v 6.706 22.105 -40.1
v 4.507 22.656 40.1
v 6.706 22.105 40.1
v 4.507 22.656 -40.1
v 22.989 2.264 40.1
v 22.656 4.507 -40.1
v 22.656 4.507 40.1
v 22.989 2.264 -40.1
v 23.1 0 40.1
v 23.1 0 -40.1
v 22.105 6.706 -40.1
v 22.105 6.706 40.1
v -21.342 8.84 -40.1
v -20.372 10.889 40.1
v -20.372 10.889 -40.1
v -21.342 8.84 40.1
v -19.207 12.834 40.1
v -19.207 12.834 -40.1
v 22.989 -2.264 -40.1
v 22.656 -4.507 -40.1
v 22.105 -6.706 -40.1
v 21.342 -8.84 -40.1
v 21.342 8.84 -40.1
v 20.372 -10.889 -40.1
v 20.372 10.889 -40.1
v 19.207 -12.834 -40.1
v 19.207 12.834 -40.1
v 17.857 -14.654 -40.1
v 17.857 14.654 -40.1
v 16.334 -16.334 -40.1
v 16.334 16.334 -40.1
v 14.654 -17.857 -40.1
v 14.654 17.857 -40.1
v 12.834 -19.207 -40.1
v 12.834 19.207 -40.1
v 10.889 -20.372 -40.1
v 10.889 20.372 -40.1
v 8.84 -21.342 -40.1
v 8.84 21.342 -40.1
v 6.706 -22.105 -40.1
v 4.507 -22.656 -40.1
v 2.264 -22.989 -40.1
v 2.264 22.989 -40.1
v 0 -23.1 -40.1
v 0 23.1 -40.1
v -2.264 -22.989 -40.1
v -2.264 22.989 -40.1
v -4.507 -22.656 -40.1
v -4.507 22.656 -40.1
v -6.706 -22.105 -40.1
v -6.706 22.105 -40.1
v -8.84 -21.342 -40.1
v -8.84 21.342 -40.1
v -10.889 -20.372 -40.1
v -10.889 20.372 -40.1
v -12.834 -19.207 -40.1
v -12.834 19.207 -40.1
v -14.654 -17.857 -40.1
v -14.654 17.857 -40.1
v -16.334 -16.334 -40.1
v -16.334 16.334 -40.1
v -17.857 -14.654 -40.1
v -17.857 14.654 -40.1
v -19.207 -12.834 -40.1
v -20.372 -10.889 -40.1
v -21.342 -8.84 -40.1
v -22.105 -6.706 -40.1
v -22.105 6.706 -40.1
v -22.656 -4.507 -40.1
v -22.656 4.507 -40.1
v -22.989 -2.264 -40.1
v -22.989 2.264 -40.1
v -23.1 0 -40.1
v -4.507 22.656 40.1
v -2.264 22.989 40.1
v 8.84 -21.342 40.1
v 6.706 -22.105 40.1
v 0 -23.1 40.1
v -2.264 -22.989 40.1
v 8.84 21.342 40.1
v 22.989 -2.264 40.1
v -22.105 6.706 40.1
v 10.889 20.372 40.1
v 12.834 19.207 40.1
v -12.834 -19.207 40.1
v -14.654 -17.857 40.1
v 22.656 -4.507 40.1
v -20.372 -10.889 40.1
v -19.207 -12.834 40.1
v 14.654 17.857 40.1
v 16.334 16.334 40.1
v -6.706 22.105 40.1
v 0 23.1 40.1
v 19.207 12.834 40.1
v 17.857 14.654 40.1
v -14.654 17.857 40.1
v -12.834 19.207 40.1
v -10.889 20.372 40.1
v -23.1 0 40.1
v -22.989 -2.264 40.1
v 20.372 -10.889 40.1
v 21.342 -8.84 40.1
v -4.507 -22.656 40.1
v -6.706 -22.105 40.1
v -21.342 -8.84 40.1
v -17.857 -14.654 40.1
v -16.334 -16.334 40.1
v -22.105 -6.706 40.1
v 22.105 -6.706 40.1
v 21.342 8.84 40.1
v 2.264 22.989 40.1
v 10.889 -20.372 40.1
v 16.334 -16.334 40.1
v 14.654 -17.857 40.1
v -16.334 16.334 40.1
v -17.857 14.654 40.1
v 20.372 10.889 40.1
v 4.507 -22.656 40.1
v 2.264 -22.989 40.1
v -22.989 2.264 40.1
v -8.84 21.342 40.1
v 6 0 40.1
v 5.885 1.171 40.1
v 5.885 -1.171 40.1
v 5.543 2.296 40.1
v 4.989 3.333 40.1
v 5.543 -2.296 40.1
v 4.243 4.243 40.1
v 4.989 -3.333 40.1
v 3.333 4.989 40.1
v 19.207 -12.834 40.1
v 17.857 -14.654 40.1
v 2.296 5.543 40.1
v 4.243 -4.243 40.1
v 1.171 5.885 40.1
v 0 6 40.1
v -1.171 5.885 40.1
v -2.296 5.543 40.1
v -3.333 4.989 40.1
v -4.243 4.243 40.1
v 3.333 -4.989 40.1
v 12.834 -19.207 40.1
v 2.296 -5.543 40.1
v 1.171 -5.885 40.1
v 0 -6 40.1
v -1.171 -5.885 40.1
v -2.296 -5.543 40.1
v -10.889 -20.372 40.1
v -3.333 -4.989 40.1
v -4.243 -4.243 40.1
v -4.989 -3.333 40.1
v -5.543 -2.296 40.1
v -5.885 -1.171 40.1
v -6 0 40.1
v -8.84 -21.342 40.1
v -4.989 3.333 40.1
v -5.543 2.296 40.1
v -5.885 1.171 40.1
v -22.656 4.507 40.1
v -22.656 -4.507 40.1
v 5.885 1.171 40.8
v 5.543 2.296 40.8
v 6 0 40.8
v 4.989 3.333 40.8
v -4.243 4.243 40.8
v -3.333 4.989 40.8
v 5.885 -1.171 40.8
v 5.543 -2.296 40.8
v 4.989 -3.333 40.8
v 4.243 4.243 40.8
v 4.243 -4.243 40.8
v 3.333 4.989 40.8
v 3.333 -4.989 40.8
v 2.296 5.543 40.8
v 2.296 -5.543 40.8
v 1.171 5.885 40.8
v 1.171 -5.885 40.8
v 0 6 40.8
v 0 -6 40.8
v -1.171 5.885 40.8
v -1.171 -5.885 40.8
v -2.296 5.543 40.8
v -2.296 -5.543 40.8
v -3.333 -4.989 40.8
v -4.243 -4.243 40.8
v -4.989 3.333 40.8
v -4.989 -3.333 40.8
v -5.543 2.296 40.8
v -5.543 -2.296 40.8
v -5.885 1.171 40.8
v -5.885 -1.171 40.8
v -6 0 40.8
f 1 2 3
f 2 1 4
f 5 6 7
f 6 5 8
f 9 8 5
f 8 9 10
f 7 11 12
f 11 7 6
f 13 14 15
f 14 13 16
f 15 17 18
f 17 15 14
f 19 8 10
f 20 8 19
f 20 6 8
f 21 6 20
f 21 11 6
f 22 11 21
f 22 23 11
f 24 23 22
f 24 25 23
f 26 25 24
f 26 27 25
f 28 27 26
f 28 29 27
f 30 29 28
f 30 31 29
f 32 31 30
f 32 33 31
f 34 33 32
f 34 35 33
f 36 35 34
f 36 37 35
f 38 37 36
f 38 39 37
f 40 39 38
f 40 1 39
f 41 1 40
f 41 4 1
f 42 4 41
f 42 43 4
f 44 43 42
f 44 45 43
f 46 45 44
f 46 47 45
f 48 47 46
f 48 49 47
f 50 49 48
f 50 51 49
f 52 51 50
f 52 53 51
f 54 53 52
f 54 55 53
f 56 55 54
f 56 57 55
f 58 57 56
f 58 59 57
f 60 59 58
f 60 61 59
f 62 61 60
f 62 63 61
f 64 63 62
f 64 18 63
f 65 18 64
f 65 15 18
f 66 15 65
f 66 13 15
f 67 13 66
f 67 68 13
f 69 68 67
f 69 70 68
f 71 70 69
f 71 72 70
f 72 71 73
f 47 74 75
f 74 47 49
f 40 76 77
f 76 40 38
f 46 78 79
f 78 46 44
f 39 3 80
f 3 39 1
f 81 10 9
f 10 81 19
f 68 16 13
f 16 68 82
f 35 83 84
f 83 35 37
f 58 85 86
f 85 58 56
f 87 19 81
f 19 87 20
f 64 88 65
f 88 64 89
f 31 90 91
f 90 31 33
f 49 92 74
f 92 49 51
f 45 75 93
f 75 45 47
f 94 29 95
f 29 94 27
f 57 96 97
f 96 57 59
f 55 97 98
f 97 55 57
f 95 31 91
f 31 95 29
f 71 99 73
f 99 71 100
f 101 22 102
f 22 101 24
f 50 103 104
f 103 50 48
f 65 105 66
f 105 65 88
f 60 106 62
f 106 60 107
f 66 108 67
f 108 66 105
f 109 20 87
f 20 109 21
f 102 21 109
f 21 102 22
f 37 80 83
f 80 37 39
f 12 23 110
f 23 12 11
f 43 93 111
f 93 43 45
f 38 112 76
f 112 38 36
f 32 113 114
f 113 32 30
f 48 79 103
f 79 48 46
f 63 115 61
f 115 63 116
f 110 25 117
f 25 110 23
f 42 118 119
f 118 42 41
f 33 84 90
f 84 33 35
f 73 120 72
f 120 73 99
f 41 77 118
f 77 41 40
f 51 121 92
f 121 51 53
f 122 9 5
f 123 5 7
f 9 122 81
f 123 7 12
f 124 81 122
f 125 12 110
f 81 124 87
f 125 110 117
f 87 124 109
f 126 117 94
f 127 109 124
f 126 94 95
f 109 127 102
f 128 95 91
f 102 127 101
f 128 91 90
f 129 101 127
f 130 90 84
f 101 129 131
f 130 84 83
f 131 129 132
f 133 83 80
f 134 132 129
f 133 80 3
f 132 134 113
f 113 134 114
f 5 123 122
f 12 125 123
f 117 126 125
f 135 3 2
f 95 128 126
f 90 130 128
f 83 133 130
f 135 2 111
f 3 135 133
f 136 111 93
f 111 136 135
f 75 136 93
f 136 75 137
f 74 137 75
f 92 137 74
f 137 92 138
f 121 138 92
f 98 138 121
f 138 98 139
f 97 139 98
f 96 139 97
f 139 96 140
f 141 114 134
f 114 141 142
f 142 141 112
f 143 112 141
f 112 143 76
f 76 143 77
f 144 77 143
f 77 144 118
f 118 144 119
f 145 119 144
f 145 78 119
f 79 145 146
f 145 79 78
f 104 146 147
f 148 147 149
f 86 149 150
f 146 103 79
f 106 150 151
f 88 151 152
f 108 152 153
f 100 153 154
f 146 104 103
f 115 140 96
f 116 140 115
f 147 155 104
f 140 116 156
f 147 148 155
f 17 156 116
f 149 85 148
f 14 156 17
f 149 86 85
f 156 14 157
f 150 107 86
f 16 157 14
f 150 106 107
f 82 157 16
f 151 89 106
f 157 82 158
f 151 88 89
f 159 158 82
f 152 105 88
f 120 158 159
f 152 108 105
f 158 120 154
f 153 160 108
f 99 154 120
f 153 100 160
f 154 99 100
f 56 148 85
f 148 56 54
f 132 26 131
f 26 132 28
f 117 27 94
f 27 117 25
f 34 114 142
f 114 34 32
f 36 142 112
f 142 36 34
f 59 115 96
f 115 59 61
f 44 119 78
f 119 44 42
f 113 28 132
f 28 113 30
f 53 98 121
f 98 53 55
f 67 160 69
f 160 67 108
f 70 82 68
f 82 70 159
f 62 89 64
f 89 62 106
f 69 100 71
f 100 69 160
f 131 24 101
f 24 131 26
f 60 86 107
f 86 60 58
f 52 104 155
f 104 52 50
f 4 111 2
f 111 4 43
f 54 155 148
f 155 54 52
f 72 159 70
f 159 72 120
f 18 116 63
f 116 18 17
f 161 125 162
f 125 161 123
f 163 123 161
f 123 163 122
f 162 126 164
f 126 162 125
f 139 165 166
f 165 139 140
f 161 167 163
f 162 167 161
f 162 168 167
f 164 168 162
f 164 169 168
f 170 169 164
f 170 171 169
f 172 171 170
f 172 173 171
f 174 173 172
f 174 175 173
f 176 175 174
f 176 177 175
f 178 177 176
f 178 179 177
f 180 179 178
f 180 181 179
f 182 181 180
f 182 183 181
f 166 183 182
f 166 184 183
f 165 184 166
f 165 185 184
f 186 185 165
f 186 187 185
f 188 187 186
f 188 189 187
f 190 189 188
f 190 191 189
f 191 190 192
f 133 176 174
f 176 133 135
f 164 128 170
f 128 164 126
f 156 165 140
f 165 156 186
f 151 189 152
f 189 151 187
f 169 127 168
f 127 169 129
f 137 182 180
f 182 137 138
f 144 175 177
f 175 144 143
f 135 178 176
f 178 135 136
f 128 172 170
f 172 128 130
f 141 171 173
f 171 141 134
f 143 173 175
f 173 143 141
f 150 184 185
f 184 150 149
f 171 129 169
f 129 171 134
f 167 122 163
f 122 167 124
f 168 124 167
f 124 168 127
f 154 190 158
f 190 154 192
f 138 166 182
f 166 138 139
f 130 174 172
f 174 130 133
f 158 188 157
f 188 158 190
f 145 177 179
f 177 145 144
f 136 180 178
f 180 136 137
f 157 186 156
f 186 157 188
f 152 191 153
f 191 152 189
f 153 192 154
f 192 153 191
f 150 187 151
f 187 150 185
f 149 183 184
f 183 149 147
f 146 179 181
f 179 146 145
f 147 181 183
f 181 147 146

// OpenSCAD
// Parameters
height_mm = 80.2; //[40.1:160.4:0.1]
diameter_mm = 46.2; //[23.1:92.4:0.1]
body_diameter_mm = 46.2; //[23.1:92.4:0.1]
body_height_mm = 80.2; //[40.1:160.4:0.1]
positive_terminal_diameter_mm = 12; //[6:24:0.1]
positive_terminal_height_mm = 1.5; //[0.75:3:0.05]
negative_terminal_diameter_mm = 18; //[9:36:0.1]
negative_terminal_height_mm = 0.3; //[0.15:0.6:0.01]
terminal_overlap_mm = 0.8; //[0.5:2:0.1]

// Battery - complete geometry
module battery() {
  union() {
    // Main cylindrical body
    color("DimGray") {
      translate([0, 0, 0])
        cylinder(r=body_diameter_mm/2, h=body_height_mm, center=true, $fn=64);
    }
    // Positive terminal button
    color("Silver") {
      translate([0, 0, body_height_mm/2 + positive_terminal_height_mm/2 - terminal_overlap_mm])
        cylinder(r=positive_terminal_diameter_mm/2, h=positive_terminal_height_mm, center=true, $fn=32);
    }
    // Negative terminal contact
    color("Silver") {
      translate([0, 0, -body_height_mm/2 - negative_terminal_height_mm/2 + terminal_overlap_mm])
        cylinder(r=negative_terminal_diameter_mm/2, h=negative_terminal_height_mm, center=true, $fn=32);
    }
  }
}

// Assembly
module assembly() {
  battery();
}

assembly();
